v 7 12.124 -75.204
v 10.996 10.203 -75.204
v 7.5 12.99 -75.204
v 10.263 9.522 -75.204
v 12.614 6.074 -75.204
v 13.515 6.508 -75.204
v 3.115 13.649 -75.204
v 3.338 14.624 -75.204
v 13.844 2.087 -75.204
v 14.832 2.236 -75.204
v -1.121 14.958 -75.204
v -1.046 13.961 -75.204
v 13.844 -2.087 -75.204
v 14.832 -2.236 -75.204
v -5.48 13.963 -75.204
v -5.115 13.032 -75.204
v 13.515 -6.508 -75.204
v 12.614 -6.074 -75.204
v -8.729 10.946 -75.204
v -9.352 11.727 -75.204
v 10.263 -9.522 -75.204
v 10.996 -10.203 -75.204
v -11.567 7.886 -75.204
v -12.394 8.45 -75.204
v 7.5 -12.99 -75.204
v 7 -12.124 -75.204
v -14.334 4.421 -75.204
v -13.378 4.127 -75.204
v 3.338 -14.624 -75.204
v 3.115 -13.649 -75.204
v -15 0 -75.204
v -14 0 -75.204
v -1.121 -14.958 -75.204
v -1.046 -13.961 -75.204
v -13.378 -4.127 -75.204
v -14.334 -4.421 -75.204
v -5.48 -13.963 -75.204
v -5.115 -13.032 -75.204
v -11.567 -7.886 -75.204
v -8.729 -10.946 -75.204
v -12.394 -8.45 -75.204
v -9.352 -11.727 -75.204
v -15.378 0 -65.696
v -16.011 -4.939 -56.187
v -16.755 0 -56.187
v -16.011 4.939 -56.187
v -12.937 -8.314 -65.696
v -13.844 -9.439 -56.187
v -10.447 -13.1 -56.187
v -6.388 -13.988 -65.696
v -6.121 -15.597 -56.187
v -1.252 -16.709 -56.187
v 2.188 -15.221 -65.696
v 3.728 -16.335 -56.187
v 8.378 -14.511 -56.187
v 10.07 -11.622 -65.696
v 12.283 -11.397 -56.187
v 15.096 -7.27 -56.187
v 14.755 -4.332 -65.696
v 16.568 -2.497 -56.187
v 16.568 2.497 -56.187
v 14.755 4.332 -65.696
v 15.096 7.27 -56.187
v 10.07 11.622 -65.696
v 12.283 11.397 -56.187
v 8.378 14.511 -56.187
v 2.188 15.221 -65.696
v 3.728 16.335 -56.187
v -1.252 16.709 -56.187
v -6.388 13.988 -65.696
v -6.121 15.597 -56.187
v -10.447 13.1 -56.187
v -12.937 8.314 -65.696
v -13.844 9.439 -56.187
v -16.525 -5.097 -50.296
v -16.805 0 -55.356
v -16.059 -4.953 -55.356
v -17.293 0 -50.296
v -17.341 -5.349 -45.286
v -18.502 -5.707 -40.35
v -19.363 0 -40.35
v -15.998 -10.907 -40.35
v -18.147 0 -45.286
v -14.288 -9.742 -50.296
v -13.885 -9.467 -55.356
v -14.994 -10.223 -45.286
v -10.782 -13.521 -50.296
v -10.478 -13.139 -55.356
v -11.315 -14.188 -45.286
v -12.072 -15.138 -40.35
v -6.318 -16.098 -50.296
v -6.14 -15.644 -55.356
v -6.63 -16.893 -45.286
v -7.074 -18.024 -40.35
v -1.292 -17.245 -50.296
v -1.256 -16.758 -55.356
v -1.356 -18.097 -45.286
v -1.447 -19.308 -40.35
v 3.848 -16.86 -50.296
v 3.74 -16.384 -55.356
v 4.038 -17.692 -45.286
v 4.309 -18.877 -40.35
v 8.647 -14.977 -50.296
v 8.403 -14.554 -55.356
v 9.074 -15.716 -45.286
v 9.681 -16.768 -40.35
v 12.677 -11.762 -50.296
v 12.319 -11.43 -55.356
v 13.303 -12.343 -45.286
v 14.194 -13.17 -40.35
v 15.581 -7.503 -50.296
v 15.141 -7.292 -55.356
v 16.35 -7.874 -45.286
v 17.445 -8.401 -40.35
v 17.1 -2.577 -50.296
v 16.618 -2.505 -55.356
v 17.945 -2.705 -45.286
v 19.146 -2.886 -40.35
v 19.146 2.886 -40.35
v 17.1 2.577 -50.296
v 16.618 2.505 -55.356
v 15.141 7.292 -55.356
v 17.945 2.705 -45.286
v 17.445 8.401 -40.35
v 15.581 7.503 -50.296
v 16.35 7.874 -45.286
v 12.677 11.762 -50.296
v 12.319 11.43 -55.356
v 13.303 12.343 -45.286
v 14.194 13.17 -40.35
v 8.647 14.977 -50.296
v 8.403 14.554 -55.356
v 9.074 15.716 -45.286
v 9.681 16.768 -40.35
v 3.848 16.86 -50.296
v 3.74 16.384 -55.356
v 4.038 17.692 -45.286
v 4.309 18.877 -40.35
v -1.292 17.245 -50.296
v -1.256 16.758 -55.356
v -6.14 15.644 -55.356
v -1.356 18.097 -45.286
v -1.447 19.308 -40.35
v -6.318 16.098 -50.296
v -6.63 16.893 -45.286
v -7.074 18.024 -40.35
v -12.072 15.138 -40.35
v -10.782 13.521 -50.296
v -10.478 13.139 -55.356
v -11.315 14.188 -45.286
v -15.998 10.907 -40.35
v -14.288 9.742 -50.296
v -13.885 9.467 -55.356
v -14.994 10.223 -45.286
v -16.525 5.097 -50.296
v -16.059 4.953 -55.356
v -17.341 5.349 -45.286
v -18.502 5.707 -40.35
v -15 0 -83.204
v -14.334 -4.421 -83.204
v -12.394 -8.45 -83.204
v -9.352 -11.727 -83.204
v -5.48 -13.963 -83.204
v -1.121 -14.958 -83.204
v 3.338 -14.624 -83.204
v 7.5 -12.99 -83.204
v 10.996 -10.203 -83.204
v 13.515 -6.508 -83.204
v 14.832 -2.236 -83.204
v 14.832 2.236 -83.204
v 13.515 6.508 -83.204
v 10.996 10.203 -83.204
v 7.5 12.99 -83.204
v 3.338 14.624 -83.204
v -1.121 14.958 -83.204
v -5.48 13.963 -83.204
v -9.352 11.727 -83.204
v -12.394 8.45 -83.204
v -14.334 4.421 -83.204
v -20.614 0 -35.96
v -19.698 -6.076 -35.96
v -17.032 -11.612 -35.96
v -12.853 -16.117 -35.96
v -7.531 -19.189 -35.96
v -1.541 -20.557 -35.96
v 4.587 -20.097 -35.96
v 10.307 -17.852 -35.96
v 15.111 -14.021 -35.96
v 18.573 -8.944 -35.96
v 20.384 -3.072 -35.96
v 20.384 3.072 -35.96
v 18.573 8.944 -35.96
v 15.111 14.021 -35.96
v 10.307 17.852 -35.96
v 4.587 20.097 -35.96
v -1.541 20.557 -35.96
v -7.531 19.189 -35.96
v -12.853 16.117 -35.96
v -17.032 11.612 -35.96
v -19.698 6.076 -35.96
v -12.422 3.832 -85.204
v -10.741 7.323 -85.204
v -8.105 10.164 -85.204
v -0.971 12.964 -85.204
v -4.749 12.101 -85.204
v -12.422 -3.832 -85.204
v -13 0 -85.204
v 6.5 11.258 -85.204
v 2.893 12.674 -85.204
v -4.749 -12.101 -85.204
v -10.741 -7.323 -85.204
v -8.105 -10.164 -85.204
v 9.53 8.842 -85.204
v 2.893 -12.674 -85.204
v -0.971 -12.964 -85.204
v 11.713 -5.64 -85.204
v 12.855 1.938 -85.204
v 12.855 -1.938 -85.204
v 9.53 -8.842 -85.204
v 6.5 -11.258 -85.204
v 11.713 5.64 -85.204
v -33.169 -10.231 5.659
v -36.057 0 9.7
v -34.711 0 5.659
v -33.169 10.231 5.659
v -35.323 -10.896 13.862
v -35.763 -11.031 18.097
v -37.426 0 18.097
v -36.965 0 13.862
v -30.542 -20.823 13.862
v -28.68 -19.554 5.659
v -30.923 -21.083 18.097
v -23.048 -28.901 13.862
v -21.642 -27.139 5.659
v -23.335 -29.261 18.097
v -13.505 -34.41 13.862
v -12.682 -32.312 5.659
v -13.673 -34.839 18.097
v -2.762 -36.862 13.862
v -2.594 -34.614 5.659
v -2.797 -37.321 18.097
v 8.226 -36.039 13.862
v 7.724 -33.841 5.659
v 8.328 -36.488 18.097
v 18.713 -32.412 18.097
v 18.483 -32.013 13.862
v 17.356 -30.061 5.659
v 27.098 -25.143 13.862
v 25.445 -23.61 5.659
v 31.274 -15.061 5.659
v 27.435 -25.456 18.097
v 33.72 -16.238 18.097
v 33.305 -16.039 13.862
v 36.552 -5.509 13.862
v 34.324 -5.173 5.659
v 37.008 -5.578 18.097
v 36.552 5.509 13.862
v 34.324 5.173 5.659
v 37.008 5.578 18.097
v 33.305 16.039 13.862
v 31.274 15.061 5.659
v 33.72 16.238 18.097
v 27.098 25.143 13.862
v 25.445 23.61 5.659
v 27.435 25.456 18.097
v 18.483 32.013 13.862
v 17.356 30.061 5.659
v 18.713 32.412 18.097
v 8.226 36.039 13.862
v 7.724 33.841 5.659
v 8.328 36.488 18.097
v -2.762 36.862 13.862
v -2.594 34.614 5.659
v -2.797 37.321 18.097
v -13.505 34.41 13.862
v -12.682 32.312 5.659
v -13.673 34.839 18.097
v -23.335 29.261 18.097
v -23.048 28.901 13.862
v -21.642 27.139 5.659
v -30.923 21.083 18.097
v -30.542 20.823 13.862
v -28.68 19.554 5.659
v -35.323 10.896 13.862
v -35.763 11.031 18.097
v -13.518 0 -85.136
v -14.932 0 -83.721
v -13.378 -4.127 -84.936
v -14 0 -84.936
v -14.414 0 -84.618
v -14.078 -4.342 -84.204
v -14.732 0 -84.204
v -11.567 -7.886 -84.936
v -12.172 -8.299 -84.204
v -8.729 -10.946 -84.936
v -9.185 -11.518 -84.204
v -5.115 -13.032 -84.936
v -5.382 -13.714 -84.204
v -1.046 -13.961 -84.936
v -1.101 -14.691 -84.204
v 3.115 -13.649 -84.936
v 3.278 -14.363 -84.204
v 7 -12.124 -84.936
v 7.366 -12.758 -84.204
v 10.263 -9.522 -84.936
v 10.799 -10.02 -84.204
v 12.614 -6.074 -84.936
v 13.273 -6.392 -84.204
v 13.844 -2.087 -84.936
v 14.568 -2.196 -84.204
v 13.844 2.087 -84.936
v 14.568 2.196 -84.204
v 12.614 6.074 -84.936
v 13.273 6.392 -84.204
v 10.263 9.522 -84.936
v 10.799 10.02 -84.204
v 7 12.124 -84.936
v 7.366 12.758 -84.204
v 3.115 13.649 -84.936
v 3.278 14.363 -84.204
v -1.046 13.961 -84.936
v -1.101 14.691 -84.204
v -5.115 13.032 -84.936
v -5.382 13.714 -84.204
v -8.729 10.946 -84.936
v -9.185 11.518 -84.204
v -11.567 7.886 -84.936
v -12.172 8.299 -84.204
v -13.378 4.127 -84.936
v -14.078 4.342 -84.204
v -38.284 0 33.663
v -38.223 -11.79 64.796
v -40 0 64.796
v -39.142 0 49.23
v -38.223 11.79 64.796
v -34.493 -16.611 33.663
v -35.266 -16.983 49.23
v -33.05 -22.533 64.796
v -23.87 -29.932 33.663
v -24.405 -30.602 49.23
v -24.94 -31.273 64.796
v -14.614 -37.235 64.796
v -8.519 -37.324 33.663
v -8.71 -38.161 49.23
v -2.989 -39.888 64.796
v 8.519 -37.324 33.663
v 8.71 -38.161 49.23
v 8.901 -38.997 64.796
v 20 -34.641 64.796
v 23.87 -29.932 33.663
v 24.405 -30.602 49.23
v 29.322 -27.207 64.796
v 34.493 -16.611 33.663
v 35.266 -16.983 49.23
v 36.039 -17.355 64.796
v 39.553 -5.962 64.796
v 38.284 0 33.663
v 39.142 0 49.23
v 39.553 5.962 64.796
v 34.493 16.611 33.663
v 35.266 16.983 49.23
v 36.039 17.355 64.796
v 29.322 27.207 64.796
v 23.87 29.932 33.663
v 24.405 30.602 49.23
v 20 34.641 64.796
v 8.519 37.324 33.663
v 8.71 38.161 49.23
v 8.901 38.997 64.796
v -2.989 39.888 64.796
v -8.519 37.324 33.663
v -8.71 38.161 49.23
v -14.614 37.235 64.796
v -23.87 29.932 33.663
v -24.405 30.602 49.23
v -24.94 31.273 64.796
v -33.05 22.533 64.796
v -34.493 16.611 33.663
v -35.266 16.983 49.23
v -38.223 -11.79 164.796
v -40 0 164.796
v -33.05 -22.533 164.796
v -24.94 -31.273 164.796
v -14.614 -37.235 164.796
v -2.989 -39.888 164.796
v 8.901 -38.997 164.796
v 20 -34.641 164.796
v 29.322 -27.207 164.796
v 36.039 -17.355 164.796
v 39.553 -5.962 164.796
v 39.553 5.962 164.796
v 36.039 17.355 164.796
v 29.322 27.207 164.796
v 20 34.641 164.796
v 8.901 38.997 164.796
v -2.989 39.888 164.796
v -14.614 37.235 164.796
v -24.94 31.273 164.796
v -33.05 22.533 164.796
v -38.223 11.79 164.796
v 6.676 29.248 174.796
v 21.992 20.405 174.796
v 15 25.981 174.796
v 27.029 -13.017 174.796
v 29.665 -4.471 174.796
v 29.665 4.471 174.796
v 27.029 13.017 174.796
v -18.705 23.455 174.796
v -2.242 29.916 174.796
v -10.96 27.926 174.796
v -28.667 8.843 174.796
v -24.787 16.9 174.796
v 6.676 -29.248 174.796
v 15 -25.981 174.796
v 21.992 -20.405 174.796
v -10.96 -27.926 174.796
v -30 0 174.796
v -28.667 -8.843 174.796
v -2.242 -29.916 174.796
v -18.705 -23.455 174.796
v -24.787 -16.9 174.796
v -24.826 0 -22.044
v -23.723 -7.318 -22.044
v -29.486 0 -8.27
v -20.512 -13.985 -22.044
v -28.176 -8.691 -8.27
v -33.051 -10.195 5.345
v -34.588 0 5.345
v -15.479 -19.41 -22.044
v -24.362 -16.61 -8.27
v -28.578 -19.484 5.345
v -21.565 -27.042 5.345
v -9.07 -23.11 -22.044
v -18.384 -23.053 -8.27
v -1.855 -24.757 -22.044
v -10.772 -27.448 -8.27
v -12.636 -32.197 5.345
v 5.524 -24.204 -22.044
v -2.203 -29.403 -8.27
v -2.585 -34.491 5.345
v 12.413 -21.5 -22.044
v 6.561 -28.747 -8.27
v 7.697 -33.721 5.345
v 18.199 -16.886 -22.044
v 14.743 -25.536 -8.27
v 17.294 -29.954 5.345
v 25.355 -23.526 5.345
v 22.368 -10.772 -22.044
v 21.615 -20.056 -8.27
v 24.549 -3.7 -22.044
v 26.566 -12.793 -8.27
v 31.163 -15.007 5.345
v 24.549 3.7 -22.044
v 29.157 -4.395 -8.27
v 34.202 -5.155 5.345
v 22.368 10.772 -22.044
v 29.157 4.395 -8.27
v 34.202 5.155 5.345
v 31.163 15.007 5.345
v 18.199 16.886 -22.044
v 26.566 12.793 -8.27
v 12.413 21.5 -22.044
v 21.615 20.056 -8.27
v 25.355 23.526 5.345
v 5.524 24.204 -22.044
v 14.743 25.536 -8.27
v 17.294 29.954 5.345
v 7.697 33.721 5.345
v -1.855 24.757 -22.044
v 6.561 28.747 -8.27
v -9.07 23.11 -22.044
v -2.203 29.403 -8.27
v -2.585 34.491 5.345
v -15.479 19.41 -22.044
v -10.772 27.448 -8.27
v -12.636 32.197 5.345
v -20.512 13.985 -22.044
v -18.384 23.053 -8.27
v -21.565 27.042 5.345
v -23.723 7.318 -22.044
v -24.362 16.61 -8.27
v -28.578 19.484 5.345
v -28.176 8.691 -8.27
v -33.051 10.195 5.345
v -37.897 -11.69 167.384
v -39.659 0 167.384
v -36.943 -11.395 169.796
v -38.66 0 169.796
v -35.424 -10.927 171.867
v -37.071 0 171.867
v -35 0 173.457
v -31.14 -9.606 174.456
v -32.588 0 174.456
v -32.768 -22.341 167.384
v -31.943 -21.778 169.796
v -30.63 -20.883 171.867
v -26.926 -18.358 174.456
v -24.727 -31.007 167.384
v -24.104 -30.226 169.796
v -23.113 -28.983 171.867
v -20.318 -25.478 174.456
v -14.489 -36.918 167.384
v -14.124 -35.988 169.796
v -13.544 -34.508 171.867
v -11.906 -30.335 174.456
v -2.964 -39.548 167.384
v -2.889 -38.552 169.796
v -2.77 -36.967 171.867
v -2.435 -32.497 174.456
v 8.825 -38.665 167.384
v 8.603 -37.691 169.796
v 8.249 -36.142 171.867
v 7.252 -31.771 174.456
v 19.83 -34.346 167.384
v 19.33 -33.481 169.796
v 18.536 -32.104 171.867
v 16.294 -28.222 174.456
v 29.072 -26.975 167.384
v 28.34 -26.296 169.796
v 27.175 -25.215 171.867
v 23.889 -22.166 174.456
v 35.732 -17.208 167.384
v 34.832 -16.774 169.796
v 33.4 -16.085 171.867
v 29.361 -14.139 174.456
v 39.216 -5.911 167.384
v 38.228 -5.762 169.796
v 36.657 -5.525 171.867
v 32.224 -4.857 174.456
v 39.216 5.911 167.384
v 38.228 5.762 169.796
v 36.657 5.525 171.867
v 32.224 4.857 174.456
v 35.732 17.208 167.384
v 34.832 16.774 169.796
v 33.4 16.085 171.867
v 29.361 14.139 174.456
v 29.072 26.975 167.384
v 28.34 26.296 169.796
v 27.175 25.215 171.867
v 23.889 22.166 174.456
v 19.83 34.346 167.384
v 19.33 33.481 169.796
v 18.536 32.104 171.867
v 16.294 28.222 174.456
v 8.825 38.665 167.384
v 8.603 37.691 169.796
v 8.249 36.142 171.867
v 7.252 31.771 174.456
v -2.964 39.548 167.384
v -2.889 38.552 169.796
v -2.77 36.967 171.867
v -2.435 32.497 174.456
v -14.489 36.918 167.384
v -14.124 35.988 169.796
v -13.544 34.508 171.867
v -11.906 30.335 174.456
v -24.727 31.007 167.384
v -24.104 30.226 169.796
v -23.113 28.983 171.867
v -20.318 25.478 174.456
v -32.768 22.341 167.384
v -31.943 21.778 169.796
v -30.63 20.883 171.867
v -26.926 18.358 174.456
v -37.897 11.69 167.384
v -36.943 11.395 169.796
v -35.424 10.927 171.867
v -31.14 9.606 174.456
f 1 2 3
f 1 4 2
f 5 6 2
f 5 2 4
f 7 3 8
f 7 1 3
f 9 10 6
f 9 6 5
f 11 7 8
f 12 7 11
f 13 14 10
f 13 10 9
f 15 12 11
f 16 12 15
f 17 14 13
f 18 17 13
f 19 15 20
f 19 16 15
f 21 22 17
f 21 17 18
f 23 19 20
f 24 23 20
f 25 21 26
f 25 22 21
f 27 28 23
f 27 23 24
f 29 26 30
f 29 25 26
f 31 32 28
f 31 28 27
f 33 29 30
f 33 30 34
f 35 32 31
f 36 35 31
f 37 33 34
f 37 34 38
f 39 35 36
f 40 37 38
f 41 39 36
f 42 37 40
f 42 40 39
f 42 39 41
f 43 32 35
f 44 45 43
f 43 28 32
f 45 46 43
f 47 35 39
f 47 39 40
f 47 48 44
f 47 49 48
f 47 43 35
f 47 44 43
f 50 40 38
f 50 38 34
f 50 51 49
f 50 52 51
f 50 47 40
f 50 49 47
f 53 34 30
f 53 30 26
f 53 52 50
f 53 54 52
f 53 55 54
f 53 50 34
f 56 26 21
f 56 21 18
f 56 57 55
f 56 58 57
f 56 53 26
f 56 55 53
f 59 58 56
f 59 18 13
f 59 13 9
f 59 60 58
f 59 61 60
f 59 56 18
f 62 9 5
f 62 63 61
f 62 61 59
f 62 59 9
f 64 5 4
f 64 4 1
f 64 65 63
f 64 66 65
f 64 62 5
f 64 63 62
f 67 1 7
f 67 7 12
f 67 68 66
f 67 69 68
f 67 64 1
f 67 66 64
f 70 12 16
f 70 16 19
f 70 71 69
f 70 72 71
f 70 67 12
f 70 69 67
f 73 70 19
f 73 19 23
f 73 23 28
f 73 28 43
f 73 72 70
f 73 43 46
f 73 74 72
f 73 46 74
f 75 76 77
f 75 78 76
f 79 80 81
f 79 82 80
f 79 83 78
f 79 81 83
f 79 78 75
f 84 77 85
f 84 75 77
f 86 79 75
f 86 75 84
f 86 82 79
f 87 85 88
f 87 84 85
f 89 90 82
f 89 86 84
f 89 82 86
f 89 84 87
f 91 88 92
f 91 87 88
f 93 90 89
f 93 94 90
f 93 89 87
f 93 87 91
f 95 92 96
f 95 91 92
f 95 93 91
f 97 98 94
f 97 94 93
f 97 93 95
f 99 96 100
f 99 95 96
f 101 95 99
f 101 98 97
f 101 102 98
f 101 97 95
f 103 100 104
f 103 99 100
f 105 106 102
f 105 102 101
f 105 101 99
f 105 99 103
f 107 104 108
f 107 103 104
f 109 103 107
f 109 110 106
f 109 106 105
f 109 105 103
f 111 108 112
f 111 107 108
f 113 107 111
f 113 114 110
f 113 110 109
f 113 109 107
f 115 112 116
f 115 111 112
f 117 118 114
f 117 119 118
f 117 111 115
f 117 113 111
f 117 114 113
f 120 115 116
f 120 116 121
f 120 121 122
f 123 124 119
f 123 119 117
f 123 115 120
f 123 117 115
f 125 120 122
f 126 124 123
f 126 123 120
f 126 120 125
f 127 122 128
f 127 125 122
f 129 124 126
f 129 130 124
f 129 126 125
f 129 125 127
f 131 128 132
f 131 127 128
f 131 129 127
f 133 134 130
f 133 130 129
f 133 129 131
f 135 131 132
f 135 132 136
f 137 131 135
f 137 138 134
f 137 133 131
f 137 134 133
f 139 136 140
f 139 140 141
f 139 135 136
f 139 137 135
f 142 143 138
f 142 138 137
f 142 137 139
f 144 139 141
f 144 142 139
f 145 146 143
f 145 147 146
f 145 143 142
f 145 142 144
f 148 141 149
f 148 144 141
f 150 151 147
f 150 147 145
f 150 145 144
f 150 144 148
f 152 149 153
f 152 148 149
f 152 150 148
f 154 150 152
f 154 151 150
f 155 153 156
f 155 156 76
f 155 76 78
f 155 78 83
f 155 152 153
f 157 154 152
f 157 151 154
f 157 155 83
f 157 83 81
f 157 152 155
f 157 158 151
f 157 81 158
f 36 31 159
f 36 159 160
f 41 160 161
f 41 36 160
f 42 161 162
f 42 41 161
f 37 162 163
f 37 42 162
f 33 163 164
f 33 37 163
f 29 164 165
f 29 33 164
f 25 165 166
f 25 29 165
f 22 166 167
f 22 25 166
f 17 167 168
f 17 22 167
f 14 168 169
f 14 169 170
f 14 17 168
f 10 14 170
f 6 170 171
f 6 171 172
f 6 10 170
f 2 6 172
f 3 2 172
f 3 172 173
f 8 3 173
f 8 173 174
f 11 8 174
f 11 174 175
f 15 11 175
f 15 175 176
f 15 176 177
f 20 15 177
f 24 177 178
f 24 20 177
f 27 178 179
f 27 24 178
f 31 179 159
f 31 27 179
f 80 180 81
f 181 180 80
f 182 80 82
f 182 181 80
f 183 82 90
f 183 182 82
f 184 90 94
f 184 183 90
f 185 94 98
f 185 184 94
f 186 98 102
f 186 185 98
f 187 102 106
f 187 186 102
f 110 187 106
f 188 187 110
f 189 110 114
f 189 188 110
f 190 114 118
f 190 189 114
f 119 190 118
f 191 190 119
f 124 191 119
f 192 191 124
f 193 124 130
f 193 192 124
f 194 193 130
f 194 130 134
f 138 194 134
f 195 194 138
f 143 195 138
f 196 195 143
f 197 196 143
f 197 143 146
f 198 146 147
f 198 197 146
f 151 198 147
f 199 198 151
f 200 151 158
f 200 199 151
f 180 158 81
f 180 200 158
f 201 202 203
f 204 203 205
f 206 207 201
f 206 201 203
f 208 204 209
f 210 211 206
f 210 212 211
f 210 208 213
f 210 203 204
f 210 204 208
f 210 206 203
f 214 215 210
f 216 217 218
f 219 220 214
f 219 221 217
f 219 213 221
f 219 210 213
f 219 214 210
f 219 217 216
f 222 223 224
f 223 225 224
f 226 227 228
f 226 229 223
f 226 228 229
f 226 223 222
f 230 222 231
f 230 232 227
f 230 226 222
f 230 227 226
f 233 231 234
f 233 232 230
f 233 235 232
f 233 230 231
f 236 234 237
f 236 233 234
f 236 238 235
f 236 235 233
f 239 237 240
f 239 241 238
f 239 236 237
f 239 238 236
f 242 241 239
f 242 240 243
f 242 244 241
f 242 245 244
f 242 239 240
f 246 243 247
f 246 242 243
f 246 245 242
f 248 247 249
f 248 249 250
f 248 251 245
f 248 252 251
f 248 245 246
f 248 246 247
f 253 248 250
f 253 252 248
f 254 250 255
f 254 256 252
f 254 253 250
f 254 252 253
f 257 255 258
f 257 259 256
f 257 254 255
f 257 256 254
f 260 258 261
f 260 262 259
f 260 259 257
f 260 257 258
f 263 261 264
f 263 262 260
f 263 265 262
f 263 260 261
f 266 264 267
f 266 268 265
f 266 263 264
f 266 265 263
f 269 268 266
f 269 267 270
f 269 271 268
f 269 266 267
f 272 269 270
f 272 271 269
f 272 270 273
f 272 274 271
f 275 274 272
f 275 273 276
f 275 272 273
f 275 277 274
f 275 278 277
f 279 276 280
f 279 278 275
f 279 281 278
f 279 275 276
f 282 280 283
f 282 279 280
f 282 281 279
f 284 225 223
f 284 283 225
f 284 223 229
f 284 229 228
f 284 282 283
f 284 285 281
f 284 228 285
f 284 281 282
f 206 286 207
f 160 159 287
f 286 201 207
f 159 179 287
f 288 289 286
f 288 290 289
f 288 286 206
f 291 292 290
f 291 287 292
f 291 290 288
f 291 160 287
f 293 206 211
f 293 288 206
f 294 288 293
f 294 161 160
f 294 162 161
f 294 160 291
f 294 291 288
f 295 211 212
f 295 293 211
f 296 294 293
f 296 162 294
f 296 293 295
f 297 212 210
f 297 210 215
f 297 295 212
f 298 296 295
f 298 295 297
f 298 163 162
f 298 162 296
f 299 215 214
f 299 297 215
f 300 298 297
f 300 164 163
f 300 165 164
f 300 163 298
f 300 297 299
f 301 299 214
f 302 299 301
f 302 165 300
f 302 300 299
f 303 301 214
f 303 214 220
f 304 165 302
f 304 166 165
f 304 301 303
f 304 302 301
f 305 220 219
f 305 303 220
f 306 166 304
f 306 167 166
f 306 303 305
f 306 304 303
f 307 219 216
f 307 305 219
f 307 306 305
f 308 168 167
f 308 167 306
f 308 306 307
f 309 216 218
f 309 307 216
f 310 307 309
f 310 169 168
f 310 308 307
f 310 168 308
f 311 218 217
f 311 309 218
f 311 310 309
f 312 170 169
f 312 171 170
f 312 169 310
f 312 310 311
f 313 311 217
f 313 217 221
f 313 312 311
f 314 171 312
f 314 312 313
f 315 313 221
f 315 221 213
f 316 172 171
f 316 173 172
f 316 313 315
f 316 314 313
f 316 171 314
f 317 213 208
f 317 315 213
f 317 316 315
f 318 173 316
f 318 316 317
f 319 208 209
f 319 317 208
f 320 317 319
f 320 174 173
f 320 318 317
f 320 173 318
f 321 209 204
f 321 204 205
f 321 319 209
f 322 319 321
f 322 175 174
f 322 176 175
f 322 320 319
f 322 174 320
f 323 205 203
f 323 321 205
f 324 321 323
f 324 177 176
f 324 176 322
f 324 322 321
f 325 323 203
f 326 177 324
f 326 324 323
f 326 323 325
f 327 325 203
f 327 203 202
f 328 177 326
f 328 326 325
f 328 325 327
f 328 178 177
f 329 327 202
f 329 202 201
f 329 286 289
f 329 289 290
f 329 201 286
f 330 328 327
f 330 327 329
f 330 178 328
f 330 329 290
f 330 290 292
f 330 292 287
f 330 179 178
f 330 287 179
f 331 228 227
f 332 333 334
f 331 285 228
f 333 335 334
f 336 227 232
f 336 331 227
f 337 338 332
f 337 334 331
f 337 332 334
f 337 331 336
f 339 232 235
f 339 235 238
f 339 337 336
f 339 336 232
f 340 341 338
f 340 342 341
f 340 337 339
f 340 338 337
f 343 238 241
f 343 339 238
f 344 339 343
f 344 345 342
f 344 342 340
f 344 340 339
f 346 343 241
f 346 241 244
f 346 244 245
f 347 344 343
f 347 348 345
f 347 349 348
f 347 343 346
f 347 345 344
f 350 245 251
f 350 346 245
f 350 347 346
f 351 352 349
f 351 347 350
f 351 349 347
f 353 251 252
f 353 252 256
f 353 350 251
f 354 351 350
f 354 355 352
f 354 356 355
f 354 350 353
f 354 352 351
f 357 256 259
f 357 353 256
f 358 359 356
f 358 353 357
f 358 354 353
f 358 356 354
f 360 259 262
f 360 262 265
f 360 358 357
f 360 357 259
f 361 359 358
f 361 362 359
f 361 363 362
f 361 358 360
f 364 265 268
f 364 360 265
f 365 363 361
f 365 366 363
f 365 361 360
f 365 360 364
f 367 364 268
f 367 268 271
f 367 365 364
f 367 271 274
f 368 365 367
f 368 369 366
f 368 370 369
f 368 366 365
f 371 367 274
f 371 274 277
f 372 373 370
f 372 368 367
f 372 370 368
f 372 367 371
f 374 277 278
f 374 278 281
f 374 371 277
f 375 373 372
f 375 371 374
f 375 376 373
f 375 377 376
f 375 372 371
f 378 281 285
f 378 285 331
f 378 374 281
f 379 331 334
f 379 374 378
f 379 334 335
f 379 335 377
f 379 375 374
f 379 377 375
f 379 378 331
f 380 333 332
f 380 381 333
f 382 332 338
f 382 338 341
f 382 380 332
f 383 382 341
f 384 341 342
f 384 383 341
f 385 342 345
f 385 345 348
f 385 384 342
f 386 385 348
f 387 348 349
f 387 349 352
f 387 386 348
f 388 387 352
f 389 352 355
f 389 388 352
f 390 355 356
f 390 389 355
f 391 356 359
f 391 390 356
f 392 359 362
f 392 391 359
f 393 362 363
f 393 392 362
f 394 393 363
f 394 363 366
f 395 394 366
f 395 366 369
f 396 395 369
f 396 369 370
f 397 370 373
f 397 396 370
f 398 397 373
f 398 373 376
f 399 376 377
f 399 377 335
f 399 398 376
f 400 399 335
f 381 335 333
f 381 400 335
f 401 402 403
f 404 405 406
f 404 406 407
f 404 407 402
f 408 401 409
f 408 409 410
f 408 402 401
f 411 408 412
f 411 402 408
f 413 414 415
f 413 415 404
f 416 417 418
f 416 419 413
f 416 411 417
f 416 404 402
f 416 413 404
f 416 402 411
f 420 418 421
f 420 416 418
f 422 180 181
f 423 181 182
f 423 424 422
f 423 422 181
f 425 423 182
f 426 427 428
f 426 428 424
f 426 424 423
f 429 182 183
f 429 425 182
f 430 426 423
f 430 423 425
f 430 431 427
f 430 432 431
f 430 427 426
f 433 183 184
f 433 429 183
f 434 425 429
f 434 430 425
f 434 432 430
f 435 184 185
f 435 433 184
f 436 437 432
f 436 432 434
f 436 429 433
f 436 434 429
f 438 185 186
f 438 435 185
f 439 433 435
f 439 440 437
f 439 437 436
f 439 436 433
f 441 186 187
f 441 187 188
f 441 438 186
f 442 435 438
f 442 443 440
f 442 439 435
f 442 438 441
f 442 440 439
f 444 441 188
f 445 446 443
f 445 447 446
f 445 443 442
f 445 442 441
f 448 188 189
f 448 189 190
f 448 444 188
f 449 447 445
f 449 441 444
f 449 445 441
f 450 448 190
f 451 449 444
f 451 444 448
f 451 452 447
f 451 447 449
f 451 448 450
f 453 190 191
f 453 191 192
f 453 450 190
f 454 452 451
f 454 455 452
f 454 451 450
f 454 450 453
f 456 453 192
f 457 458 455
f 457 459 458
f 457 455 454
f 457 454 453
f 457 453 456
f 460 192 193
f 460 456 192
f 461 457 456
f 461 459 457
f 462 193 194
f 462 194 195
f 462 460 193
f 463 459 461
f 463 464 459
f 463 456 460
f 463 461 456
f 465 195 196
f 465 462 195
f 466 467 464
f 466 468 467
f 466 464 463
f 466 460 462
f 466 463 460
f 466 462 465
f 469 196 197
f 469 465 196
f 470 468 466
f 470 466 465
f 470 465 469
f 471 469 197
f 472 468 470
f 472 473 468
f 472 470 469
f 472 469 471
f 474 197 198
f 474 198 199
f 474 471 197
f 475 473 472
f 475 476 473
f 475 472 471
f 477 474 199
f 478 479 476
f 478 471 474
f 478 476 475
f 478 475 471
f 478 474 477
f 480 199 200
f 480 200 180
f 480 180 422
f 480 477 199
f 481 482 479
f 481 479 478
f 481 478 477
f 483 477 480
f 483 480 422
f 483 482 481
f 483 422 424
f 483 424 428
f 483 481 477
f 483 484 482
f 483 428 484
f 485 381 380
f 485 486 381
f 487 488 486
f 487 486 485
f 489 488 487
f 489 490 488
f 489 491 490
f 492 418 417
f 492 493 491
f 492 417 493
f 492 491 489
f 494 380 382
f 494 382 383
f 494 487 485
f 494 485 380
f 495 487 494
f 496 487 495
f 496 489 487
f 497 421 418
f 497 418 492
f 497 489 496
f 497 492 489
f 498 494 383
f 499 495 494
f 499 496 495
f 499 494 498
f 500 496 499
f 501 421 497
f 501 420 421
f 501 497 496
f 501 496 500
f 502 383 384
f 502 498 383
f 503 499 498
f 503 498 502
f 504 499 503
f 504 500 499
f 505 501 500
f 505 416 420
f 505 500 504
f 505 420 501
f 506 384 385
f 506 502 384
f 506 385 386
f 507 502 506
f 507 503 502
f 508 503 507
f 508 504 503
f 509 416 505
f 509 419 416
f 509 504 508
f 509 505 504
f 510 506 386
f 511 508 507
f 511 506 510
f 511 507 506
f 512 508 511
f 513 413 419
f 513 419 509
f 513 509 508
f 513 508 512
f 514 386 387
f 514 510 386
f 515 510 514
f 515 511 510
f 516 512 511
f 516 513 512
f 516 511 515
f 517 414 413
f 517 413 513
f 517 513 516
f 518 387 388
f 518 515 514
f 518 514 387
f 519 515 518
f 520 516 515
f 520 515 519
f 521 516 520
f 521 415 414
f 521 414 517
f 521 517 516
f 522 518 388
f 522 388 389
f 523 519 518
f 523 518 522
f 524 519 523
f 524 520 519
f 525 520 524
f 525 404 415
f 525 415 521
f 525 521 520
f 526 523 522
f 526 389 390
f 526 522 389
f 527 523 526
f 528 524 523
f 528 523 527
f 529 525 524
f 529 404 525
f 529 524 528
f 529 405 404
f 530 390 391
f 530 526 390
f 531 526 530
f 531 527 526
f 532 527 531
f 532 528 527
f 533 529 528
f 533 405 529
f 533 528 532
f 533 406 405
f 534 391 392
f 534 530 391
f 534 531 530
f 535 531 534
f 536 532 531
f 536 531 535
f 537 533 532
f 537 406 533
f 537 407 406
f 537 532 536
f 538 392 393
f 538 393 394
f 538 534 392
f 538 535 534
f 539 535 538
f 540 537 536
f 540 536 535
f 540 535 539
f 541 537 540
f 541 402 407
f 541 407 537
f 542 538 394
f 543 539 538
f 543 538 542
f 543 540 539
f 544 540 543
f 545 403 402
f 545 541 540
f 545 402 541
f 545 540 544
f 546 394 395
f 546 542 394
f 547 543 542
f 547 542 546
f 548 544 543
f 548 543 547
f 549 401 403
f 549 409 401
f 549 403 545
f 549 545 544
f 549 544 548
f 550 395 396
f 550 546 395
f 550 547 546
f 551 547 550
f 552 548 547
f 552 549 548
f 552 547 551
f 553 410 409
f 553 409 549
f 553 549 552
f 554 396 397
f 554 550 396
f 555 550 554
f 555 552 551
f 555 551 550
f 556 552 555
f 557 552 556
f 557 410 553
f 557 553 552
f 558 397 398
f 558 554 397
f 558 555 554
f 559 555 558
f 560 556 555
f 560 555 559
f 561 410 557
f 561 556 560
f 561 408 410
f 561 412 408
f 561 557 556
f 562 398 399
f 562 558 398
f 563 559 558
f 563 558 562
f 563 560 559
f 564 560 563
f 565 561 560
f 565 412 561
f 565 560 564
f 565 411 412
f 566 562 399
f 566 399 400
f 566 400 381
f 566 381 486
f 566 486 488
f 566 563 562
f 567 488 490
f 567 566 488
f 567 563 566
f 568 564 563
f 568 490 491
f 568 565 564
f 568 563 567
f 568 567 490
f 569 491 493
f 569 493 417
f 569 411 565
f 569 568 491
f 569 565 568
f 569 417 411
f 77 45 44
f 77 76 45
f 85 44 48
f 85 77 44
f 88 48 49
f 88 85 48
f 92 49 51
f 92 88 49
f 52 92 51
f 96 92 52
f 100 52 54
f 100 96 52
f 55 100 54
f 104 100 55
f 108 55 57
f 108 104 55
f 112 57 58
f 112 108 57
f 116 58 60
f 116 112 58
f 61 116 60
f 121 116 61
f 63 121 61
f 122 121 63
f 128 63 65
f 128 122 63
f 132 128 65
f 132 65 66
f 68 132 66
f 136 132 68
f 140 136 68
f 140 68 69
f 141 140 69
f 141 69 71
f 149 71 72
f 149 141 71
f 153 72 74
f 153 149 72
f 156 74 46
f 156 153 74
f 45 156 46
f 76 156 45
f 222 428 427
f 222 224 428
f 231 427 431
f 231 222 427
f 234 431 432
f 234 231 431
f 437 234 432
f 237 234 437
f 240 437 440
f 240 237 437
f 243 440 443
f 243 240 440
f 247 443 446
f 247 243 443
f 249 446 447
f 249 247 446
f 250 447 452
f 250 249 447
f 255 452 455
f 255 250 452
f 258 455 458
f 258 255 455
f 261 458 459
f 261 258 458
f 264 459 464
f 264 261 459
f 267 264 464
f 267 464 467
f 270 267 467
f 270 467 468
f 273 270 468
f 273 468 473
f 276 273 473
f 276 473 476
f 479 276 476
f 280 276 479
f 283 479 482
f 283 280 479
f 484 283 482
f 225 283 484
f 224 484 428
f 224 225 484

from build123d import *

# Parameters (mm, degrees)
FILLET1_R = 2


with BuildPart() as part:
    # Sketch1 → Revolve1 (revolve)
    with BuildSketch(Plane(origin=(0, 0, 0), x_dir=(1, 0, 0), z_dir=(0, 1, 0)), mode=Mode.PRIVATE) as revolve1_sk:
        with BuildLine():
            Line((0, 85.203744498), (15, 85.203744498))
            Line((15, 85.203744498), (15, 75.203744498))
            Line((15, 75.203744498), (14, 75.203744498))
            Line((14, 75.203744498), (16.755430859, 56.187296855))
            Line((16.755430859, 56.187296855), (16.805273968, 55.355672424))
            ThreePointArc((16.805273968, 55.355672424), (17.674850572, 47.783264008), (19.362594994, 40.350293442))
            Line((19.362594994, 40.350293442), (20.614214842, 35.960443447))
            ThreePointArc((20.614214842, 35.960443447), (27.100498023, 15.138305045), (34.588001623, -5.345117691))
            Line((34.588001623, -5.345117691), (34.711447428, -5.659018669))
            ThreePointArc((34.711447428, -5.659018669), (36.566659948, -11.769202622), (37.425911626, -18.096749382))
            Line((37.425911626, -18.096749382), (40, -64.796255502))
            Line((40, -64.796255502), (40, -164.796255502))
            ThreePointArc((40, -164.796255502), (37.071067812, -171.867323314), (30, -174.796255502))
            Line((30, -174.796255502), (0, -174.796255502))
            Line((0, -174.796255502), (0, 85.203744498))
        make_face()
    revolve(revolve1_sk.sketch.rotate(Axis((0, 0, -47.713129303), (0, 0, 1)), 180), axis=Axis((0, 0, -47.713129303), (0, 0, 1)))

    # Fillet1
    fillet1_edges = [part.edges().sort_by_distance(p)[0] for p in [
        (15, 0, -85.203744498),
    ]]
    fillet(fillet1_edges, radius=FILLET1_R)


solid = part.part
